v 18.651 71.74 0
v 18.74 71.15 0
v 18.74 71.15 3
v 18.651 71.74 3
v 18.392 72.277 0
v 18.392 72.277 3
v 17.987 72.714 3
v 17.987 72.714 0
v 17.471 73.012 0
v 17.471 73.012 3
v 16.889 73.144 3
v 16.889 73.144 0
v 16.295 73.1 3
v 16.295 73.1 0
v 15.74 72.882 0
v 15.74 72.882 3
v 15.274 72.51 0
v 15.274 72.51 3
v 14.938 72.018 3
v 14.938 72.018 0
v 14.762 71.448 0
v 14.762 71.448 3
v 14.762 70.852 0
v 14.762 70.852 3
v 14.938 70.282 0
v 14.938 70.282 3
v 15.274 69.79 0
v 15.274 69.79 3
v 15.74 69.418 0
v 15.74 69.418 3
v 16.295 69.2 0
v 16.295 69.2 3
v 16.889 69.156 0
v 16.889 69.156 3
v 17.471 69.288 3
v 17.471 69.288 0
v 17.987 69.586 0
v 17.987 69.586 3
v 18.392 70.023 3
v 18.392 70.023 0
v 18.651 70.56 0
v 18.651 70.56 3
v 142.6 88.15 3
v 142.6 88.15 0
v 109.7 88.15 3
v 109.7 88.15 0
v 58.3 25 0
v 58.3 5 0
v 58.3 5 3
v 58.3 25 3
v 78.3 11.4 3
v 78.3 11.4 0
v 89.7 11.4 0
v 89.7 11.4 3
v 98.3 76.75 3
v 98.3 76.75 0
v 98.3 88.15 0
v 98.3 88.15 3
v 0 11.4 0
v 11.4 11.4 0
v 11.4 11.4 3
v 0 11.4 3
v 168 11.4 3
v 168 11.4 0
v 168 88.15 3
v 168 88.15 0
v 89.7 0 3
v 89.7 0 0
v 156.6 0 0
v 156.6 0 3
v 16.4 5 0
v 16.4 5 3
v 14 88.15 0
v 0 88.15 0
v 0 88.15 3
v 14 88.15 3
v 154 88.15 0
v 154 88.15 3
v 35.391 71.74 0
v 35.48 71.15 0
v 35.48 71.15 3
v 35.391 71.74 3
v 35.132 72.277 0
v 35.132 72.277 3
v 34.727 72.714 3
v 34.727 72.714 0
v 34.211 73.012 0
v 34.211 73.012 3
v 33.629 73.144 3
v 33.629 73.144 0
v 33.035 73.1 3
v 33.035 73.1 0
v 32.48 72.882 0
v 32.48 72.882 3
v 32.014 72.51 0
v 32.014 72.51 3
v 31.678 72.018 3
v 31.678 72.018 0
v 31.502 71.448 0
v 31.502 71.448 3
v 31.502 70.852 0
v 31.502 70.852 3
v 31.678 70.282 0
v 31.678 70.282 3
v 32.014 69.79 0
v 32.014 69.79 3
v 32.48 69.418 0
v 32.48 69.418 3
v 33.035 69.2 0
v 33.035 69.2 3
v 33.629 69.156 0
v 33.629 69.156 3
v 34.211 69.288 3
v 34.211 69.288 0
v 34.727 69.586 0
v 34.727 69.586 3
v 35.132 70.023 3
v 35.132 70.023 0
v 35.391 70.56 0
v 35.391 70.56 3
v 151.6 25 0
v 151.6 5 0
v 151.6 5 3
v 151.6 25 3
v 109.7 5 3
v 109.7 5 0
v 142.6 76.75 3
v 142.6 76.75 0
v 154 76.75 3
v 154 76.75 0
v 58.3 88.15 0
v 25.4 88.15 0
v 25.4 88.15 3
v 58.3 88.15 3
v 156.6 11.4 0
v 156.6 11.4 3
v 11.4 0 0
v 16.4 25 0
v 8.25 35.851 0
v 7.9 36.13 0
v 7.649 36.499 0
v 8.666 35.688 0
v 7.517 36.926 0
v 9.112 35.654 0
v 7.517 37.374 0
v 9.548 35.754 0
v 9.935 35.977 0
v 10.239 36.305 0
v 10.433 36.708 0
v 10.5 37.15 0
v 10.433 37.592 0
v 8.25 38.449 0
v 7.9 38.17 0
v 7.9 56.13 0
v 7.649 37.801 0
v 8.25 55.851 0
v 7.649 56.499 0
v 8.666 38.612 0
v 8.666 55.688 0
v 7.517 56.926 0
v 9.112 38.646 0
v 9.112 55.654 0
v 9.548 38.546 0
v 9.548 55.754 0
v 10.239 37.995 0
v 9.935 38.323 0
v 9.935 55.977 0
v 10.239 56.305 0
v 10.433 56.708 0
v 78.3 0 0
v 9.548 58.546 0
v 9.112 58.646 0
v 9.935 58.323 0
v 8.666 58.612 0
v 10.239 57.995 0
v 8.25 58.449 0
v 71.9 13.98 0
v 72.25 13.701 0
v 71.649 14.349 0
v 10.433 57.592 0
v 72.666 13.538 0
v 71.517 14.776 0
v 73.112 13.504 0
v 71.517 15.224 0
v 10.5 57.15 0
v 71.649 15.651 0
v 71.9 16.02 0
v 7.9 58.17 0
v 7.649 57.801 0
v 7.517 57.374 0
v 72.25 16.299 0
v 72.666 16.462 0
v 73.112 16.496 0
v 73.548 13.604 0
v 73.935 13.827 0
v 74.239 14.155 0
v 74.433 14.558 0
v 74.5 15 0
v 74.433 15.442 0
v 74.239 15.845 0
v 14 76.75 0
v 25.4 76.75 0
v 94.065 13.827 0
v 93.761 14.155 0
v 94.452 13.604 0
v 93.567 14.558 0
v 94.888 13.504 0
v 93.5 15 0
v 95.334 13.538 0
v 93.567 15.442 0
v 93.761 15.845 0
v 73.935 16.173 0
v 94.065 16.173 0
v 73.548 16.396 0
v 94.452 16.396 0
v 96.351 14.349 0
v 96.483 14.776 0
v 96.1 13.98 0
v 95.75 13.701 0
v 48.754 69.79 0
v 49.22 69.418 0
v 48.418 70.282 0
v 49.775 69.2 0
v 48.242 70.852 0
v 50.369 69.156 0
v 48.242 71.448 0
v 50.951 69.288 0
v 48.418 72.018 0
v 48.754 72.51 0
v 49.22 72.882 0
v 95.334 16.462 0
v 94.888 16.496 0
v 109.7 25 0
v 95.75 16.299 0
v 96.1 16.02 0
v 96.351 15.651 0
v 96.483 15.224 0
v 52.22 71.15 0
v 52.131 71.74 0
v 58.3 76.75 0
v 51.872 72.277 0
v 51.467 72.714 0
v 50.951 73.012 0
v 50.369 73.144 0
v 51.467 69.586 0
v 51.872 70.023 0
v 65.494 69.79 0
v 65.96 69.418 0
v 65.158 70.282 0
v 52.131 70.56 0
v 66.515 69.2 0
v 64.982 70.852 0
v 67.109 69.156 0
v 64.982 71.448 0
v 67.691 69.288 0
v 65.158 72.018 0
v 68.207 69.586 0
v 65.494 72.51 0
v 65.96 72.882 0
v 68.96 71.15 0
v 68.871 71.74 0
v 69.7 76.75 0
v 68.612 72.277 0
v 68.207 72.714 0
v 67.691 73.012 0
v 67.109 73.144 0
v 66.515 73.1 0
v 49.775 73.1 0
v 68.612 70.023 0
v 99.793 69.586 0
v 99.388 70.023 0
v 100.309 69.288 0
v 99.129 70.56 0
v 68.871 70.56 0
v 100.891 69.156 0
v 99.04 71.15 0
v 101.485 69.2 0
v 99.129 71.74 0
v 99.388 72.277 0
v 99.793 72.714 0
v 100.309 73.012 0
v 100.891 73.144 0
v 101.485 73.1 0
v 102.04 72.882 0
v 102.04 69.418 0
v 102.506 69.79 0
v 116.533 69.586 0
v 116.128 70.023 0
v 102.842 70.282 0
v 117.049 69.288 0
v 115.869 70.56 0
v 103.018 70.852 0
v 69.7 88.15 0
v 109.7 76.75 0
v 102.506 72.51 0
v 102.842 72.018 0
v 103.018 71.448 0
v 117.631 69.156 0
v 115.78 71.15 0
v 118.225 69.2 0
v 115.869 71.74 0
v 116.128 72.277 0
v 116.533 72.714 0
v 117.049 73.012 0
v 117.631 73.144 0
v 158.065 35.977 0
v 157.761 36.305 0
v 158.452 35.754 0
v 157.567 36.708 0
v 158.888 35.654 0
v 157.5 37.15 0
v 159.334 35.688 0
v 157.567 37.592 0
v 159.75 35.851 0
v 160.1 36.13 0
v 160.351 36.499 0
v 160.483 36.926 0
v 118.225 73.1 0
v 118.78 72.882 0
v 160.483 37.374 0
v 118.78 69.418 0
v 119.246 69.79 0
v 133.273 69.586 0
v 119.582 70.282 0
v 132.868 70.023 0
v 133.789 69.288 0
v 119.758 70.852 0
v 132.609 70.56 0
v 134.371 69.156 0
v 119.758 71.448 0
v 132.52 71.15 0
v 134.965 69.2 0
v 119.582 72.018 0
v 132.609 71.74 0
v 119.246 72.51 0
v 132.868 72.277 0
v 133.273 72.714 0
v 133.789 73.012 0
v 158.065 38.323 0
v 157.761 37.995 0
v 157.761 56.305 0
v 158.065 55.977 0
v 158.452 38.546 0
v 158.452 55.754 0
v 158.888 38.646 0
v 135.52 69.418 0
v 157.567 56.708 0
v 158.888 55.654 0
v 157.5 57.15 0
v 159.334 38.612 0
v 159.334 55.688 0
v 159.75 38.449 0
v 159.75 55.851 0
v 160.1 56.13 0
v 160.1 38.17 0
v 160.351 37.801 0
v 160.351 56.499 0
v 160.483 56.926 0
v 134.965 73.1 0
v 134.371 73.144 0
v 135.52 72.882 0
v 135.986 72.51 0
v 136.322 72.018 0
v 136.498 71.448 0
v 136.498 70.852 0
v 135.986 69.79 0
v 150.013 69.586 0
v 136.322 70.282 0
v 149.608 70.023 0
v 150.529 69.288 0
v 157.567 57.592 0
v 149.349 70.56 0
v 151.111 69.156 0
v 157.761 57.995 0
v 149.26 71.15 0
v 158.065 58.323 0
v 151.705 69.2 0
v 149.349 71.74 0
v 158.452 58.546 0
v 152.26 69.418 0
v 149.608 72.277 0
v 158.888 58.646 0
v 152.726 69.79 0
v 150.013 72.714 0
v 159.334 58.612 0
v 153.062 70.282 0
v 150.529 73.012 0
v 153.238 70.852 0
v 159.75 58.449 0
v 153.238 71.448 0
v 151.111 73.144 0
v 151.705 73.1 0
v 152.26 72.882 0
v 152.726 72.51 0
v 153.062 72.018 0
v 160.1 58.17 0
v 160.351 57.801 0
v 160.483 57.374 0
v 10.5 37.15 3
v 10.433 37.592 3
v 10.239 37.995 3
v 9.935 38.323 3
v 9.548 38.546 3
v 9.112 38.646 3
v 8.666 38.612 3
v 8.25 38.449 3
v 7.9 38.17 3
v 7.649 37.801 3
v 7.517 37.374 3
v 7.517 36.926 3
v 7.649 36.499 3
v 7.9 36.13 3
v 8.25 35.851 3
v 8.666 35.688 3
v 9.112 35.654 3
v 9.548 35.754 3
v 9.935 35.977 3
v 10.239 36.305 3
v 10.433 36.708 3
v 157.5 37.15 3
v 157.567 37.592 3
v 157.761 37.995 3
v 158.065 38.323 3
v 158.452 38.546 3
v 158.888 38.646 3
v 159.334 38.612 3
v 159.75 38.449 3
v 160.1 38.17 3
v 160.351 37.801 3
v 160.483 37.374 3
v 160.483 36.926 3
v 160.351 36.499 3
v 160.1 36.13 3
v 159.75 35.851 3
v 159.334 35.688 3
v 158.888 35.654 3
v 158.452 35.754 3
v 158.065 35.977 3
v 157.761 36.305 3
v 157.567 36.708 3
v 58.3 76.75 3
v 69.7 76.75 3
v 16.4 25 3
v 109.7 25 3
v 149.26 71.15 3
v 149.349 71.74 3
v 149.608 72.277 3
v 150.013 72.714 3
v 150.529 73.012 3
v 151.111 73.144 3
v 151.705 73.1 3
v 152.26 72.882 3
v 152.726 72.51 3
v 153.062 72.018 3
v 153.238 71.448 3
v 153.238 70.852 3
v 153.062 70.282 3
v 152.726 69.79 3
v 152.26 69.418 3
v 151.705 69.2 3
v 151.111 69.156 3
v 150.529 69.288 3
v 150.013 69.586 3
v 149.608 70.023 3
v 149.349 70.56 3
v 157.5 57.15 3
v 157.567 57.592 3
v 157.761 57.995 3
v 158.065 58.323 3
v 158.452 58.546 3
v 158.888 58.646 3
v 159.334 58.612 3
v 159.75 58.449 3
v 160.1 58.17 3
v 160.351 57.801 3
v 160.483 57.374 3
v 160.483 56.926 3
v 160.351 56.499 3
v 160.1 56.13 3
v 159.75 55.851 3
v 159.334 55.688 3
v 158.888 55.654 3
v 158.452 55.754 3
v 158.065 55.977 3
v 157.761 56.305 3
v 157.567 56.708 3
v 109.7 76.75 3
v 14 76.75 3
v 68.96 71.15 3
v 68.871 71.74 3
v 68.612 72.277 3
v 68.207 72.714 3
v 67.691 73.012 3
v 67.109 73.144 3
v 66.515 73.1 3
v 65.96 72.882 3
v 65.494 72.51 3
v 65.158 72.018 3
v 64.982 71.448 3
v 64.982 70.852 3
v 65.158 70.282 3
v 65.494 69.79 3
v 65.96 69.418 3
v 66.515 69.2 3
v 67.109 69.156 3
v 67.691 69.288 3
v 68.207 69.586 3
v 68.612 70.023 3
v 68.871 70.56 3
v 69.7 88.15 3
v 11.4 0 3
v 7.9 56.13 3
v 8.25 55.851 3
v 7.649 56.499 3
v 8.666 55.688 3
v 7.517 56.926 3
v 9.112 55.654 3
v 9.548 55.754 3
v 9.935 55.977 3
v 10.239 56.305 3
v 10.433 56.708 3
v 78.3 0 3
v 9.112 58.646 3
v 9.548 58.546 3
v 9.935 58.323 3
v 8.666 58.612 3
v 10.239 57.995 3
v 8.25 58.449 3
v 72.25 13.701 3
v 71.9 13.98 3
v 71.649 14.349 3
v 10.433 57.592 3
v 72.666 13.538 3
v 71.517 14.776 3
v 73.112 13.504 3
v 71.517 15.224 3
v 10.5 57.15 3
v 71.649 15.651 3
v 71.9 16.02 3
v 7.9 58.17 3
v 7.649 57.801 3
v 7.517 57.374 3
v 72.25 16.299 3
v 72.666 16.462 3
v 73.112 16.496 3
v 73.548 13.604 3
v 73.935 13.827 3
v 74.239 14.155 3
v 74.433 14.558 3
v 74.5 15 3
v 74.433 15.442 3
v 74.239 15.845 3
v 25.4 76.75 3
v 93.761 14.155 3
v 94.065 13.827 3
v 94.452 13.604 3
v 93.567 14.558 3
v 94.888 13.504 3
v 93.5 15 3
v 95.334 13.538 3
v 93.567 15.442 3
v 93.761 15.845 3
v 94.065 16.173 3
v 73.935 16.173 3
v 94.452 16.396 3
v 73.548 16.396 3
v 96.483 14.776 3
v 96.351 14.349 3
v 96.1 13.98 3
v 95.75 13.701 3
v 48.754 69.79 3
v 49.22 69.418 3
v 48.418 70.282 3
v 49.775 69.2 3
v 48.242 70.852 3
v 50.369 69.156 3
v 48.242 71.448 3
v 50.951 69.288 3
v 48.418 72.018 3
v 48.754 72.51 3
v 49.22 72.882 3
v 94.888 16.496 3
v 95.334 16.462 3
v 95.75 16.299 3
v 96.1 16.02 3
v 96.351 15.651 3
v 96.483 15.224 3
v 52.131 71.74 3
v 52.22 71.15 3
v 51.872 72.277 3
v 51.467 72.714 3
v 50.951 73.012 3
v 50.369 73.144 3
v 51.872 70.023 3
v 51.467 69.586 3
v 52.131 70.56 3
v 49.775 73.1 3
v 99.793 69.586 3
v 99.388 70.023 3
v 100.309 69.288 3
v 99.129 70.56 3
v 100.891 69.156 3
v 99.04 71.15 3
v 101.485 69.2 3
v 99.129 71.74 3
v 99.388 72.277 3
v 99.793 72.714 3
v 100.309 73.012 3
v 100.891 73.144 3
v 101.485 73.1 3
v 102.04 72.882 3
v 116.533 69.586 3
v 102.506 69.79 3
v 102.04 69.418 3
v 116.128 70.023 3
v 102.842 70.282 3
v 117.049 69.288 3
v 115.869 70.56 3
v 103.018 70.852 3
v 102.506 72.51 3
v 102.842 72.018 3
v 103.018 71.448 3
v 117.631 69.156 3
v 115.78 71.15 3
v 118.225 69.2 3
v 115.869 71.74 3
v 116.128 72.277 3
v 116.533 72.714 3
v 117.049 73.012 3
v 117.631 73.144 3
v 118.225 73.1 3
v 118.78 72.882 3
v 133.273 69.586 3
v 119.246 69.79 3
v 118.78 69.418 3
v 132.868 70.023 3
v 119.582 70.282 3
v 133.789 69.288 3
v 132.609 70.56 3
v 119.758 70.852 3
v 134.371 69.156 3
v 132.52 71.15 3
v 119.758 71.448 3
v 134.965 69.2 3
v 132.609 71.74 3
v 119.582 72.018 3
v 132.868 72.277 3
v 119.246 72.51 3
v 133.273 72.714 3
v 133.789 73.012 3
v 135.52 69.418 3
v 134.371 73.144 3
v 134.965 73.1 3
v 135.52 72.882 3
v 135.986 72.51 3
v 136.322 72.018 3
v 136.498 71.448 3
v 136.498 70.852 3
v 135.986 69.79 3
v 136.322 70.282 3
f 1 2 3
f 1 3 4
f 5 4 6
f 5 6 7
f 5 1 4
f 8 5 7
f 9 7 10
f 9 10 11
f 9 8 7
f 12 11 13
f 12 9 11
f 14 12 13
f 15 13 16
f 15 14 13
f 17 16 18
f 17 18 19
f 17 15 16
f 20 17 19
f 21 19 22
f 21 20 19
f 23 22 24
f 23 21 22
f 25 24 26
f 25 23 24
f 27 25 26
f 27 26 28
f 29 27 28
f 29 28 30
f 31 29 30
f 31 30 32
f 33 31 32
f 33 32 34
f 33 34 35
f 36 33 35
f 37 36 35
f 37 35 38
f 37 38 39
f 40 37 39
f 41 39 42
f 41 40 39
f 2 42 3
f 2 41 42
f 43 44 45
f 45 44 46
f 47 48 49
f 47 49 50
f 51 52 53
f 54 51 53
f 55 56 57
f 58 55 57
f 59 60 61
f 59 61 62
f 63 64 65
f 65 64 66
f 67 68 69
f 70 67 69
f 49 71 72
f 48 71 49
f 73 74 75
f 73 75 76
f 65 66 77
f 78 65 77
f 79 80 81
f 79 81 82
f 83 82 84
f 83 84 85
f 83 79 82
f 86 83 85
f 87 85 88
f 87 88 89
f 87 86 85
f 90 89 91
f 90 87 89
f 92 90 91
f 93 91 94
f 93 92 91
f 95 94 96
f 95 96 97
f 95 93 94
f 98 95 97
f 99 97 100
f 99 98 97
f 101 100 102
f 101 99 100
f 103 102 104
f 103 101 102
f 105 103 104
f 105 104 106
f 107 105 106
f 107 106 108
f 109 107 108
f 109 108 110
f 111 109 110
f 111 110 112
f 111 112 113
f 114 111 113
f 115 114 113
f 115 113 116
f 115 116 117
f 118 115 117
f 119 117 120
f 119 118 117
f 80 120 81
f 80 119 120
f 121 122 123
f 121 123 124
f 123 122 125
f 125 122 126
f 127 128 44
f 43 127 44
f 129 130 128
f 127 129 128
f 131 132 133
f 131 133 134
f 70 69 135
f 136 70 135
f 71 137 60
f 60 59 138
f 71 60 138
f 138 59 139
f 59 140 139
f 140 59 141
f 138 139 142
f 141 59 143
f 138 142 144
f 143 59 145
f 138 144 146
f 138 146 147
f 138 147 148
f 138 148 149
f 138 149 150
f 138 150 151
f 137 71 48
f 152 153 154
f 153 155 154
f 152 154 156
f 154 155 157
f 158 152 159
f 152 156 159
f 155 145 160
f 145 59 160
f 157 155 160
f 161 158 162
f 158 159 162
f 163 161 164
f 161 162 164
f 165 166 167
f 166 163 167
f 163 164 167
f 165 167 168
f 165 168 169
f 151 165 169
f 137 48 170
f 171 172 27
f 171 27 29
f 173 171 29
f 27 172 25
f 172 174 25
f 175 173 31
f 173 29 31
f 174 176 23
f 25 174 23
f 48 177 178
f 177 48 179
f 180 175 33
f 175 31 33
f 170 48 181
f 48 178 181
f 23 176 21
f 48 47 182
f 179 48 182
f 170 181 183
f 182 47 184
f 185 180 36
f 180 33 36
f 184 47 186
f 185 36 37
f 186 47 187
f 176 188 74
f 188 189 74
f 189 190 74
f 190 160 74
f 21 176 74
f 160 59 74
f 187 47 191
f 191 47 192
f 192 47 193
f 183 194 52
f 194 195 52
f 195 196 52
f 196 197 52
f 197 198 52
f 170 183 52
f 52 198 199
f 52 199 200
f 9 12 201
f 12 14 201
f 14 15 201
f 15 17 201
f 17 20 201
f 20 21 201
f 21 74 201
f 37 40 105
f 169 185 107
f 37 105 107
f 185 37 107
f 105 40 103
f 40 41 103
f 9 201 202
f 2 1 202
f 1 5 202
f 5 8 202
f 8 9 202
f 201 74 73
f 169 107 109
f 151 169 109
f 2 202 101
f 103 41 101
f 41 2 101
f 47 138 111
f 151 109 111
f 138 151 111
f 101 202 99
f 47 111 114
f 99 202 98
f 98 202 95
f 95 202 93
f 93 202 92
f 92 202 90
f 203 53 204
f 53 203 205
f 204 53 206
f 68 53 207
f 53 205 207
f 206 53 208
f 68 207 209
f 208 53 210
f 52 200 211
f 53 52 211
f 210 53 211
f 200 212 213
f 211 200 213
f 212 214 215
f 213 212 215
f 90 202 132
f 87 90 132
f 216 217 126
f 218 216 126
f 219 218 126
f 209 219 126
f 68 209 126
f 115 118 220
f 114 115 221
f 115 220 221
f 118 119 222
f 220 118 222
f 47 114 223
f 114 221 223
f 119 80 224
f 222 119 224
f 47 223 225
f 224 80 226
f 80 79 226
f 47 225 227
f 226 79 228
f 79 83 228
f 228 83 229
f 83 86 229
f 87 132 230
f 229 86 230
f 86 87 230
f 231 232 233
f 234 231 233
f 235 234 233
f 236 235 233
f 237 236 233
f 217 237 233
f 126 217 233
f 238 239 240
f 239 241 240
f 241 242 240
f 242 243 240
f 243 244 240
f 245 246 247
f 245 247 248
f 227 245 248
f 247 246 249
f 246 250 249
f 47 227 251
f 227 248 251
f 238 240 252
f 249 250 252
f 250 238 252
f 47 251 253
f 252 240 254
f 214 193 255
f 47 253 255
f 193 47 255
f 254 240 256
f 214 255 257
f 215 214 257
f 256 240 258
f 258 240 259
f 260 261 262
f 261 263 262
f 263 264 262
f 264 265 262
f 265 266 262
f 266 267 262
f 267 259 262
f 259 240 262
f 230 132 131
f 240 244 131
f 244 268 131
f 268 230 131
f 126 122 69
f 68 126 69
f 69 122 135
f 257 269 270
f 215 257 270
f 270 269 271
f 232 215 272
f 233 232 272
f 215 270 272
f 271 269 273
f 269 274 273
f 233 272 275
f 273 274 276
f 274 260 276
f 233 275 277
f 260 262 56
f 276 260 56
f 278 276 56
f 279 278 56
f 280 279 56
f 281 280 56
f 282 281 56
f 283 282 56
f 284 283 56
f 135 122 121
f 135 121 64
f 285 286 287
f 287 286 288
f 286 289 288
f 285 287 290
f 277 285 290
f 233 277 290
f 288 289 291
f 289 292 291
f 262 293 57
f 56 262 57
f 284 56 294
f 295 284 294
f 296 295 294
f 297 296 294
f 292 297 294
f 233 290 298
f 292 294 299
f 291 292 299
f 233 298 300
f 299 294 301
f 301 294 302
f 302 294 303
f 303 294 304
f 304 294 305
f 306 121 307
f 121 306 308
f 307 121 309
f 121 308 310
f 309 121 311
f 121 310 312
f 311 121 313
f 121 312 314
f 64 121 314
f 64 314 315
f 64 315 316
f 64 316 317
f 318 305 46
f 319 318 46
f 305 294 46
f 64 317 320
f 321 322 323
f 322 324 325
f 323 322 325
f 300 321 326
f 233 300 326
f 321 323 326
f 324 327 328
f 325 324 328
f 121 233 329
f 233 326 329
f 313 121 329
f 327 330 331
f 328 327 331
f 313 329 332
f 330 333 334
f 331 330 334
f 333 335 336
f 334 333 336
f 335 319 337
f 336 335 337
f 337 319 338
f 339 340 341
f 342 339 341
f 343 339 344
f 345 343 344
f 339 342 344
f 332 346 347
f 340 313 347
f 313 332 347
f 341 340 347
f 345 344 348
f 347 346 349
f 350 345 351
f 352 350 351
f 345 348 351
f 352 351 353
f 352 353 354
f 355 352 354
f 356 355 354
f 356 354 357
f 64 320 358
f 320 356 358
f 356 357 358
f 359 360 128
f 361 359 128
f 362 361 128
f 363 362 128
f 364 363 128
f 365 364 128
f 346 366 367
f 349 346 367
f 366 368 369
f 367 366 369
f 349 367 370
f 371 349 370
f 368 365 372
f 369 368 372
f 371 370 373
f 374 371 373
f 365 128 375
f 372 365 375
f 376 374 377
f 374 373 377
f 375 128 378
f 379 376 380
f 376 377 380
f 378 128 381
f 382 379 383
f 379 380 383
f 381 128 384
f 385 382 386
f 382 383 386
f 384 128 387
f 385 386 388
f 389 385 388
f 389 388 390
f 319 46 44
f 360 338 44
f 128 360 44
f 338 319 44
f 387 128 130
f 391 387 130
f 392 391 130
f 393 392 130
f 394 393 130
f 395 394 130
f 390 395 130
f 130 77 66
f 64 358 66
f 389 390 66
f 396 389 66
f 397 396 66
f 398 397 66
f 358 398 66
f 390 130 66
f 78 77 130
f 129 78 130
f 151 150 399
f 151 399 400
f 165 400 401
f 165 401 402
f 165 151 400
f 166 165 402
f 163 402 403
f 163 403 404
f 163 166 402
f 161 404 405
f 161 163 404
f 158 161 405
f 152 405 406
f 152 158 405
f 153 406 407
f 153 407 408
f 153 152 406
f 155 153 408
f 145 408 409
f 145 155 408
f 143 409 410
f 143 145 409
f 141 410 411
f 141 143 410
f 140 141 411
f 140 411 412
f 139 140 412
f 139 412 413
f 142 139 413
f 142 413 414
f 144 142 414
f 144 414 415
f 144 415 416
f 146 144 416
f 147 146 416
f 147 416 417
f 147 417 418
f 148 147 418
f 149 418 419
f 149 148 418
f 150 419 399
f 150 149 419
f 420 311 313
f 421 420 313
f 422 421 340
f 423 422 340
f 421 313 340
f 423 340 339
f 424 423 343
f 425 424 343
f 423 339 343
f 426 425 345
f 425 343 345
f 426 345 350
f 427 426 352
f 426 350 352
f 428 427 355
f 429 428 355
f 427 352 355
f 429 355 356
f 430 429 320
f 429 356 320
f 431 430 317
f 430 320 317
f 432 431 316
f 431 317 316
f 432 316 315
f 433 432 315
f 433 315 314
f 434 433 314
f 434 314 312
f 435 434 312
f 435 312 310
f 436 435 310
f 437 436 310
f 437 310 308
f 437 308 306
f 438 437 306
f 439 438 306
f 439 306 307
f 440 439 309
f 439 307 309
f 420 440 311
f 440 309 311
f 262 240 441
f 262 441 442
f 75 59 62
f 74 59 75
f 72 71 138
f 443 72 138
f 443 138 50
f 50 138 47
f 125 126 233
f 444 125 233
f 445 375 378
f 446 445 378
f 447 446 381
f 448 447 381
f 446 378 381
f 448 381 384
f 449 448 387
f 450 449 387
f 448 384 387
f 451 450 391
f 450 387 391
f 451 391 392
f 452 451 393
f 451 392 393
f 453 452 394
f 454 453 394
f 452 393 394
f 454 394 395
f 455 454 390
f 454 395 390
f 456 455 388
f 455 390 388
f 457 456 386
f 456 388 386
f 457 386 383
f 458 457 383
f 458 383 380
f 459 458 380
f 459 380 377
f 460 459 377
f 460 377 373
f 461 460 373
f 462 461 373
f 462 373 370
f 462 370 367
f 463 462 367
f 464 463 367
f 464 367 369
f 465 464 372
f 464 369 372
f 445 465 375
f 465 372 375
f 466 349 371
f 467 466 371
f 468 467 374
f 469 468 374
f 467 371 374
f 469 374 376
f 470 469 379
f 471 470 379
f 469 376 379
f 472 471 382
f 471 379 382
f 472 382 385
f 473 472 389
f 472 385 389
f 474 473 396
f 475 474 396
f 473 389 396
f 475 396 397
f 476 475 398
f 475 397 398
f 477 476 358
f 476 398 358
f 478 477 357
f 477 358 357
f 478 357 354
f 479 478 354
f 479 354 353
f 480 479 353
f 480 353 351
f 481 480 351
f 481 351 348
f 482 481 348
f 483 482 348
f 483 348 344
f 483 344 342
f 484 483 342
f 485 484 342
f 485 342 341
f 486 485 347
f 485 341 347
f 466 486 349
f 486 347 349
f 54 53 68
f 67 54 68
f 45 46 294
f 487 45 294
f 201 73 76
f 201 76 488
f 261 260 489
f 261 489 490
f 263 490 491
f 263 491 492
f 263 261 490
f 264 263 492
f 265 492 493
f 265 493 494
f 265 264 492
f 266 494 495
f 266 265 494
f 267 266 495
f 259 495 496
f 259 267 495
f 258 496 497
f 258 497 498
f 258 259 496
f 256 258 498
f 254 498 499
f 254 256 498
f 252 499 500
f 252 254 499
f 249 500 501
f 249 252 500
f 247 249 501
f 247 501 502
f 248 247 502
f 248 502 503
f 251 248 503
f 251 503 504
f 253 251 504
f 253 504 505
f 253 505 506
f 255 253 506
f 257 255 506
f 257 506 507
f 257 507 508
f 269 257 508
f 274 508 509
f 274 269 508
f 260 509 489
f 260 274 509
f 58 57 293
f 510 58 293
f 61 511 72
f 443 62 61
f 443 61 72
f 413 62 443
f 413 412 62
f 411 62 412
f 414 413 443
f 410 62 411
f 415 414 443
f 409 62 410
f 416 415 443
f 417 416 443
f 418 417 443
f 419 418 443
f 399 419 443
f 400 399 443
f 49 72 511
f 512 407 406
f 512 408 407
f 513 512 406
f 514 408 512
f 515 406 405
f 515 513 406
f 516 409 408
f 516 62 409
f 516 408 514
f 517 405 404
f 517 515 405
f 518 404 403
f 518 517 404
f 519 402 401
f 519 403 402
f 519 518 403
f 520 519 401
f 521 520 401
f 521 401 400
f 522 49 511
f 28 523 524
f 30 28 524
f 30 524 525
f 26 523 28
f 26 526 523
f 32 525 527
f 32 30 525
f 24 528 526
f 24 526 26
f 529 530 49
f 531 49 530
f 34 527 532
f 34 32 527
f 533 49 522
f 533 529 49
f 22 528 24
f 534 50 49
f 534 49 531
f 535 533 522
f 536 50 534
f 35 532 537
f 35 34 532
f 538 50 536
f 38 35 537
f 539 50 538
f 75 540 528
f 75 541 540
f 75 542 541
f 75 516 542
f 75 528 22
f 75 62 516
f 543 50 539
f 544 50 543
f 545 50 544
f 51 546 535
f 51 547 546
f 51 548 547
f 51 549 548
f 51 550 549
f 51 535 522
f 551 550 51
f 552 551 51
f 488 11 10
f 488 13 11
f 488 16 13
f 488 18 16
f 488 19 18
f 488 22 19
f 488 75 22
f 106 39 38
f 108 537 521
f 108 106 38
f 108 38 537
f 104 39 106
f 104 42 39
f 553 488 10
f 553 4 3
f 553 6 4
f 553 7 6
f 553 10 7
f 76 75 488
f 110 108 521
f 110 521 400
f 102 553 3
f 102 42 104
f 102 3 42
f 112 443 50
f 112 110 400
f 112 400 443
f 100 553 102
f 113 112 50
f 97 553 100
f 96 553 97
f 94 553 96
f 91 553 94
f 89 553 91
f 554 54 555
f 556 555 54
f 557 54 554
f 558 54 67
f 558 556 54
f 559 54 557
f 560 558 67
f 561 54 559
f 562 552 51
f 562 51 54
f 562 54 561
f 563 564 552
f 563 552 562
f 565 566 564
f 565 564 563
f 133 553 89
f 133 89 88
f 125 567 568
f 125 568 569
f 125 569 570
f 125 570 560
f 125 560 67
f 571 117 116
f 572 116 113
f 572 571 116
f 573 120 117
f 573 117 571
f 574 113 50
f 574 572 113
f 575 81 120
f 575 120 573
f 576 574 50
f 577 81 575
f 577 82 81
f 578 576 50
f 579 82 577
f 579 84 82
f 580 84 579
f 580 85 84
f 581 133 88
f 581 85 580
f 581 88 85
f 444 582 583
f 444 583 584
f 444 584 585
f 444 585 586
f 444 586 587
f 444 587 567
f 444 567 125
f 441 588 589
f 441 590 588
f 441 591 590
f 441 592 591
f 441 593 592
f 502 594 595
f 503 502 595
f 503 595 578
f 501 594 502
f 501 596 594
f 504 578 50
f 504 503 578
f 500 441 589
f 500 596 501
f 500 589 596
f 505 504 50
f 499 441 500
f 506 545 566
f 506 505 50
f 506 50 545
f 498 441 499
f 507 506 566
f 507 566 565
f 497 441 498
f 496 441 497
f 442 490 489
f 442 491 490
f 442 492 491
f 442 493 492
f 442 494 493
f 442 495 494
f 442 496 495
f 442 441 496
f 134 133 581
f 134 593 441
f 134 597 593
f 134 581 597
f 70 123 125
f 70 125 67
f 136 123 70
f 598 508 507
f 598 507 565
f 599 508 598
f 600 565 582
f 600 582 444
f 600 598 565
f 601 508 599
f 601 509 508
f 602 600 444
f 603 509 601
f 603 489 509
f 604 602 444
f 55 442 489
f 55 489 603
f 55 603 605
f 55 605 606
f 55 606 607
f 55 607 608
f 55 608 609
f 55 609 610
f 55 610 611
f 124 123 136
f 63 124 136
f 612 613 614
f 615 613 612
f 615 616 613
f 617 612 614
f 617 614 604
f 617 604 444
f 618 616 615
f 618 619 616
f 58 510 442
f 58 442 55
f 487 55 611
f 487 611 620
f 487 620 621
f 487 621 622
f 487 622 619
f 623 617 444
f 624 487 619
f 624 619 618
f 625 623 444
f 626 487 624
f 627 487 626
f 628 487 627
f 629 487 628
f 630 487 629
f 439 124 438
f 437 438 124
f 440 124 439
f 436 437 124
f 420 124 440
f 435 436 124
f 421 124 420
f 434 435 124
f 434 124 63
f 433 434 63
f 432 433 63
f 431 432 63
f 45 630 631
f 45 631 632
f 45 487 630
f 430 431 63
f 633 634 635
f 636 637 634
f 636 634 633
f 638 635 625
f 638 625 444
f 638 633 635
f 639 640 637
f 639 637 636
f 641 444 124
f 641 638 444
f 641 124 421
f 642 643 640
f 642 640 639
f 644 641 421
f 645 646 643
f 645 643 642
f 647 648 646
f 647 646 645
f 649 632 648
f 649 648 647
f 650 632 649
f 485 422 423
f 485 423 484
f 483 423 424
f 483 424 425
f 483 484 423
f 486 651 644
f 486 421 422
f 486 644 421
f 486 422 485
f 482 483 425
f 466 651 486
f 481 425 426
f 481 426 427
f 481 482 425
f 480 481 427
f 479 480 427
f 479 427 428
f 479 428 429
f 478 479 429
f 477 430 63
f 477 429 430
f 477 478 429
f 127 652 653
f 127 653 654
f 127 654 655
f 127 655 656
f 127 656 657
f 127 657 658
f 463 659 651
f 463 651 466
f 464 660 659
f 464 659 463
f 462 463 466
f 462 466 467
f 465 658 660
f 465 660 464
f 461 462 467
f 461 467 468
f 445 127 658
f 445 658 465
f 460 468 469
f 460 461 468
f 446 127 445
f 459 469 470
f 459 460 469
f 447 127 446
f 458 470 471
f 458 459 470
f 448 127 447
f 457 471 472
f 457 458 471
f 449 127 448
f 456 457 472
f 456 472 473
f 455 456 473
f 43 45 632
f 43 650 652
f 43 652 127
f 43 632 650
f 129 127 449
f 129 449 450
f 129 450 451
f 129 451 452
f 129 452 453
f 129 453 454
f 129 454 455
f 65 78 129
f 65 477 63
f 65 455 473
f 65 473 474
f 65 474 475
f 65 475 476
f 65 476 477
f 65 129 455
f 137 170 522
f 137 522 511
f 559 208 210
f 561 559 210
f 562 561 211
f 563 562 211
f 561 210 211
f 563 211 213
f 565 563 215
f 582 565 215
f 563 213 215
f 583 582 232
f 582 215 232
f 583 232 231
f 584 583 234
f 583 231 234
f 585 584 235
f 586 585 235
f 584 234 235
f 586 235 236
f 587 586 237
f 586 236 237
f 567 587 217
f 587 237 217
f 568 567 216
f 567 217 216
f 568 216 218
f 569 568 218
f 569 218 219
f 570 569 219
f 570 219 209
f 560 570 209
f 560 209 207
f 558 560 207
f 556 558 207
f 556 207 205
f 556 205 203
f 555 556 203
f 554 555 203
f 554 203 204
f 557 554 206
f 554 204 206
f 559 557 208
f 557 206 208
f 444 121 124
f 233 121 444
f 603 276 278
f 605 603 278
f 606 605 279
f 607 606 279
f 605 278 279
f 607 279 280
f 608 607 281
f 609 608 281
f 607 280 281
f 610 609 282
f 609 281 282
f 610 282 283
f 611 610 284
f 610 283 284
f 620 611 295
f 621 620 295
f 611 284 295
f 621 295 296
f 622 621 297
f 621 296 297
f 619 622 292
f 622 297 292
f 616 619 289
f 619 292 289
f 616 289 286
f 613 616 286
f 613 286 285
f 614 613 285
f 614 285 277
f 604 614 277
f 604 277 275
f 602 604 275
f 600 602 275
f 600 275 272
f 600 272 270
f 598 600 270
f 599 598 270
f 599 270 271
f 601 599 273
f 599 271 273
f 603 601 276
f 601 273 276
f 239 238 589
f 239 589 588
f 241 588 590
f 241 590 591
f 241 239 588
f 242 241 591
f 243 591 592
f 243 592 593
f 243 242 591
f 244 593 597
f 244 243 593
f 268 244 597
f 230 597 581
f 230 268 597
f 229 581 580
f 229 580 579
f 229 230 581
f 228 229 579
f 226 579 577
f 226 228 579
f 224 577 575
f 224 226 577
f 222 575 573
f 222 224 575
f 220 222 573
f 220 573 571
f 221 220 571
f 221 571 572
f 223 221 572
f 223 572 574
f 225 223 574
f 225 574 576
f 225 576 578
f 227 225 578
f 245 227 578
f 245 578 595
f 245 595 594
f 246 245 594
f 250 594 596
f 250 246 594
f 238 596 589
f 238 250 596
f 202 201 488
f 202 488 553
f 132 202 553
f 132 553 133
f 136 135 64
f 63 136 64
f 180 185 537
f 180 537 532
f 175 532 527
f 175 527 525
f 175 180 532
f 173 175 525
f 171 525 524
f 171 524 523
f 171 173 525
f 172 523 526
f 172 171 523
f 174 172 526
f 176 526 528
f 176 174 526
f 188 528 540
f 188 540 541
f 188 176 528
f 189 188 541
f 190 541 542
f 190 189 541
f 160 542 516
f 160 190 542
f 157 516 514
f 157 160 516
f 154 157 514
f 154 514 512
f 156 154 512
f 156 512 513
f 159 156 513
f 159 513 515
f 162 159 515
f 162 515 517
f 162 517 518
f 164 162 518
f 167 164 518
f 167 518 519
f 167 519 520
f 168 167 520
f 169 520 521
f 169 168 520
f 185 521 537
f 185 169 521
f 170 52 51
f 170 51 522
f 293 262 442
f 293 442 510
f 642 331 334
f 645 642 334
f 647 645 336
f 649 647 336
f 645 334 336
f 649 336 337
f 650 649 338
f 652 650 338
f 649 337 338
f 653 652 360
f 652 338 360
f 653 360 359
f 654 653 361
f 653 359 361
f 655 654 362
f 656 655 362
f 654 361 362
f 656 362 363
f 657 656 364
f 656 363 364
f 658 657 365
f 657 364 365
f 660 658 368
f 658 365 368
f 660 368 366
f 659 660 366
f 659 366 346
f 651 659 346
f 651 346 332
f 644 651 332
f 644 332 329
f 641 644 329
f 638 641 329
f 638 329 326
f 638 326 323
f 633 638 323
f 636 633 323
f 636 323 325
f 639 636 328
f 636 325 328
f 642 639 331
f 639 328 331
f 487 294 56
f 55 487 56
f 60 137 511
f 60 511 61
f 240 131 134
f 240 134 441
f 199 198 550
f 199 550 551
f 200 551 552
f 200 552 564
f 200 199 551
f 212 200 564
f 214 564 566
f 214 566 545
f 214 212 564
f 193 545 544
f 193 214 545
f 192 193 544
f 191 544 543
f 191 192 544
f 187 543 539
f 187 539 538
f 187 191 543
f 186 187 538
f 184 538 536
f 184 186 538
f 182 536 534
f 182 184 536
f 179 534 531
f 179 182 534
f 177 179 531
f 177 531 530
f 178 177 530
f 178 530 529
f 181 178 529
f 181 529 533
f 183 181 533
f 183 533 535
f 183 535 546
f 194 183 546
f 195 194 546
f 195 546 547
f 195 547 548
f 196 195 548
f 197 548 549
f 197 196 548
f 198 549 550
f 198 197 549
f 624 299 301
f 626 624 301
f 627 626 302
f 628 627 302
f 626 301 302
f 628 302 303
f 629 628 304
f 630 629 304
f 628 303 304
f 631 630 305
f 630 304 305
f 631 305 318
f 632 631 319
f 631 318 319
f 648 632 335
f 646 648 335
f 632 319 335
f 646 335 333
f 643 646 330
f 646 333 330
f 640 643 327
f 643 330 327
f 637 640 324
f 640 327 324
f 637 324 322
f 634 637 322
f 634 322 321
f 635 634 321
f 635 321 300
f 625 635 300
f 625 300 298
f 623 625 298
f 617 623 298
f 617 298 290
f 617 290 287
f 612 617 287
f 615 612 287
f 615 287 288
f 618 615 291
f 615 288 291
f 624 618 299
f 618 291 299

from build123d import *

# Parameters (mm, degrees)
SKETCH_R   = 2
SKETCH_R_2 = 1.5
SKETCH_W   = 41.9
SKETCH_H   = 20
PAD_DEPTH  = 3


with BuildPart() as part:
    # Sketch → Pad (new body)
    with BuildSketch(Plane.XY):
        Polygon((0, 88.15), (14, 88.15), (14, 76.75), (25.4, 76.75), (25.4, 88.15), (58.3, 88.15), (58.3, 76.75), (69.7, 76.75), (69.7, 88.15), (84, 88.15), (84, 11.4), (78.3, 11.4), (78.3, 0), (11.4, 0), (11.4, 11.4), (0, 11.4), align=None)
        with Locations((16.74, 71.15)):
            Circle(SKETCH_R, mode=Mode.SUBTRACT)
        with Locations((33.48, 71.15)):
            Circle(SKETCH_R, mode=Mode.SUBTRACT)
        with Locations((50.22, 71.15)):
            Circle(SKETCH_R, mode=Mode.SUBTRACT)
        with Locations((66.96, 71.15)):
            Circle(SKETCH_R, mode=Mode.SUBTRACT)
        with Locations((73, 15)):
            Circle(SKETCH_R_2, mode=Mode.SUBTRACT)
        with Locations((9, 57.15)):
            Circle(SKETCH_R_2, mode=Mode.SUBTRACT)
        with Locations((9, 37.15)):
            Circle(SKETCH_R_2, mode=Mode.SUBTRACT)
        with Locations((37.35, 15)):
            Rectangle(SKETCH_W, SKETCH_H, mode=Mode.SUBTRACT)
    pad = extrude(amount=PAD_DEPTH)

    # Mirrored: Pad across face of Pad
    add(pad.mirror(Plane(origin=(84, 49.775, 1.5), x_dir=(0, 1, 0), z_dir=(1, 0, 0))))


solid = part.part
